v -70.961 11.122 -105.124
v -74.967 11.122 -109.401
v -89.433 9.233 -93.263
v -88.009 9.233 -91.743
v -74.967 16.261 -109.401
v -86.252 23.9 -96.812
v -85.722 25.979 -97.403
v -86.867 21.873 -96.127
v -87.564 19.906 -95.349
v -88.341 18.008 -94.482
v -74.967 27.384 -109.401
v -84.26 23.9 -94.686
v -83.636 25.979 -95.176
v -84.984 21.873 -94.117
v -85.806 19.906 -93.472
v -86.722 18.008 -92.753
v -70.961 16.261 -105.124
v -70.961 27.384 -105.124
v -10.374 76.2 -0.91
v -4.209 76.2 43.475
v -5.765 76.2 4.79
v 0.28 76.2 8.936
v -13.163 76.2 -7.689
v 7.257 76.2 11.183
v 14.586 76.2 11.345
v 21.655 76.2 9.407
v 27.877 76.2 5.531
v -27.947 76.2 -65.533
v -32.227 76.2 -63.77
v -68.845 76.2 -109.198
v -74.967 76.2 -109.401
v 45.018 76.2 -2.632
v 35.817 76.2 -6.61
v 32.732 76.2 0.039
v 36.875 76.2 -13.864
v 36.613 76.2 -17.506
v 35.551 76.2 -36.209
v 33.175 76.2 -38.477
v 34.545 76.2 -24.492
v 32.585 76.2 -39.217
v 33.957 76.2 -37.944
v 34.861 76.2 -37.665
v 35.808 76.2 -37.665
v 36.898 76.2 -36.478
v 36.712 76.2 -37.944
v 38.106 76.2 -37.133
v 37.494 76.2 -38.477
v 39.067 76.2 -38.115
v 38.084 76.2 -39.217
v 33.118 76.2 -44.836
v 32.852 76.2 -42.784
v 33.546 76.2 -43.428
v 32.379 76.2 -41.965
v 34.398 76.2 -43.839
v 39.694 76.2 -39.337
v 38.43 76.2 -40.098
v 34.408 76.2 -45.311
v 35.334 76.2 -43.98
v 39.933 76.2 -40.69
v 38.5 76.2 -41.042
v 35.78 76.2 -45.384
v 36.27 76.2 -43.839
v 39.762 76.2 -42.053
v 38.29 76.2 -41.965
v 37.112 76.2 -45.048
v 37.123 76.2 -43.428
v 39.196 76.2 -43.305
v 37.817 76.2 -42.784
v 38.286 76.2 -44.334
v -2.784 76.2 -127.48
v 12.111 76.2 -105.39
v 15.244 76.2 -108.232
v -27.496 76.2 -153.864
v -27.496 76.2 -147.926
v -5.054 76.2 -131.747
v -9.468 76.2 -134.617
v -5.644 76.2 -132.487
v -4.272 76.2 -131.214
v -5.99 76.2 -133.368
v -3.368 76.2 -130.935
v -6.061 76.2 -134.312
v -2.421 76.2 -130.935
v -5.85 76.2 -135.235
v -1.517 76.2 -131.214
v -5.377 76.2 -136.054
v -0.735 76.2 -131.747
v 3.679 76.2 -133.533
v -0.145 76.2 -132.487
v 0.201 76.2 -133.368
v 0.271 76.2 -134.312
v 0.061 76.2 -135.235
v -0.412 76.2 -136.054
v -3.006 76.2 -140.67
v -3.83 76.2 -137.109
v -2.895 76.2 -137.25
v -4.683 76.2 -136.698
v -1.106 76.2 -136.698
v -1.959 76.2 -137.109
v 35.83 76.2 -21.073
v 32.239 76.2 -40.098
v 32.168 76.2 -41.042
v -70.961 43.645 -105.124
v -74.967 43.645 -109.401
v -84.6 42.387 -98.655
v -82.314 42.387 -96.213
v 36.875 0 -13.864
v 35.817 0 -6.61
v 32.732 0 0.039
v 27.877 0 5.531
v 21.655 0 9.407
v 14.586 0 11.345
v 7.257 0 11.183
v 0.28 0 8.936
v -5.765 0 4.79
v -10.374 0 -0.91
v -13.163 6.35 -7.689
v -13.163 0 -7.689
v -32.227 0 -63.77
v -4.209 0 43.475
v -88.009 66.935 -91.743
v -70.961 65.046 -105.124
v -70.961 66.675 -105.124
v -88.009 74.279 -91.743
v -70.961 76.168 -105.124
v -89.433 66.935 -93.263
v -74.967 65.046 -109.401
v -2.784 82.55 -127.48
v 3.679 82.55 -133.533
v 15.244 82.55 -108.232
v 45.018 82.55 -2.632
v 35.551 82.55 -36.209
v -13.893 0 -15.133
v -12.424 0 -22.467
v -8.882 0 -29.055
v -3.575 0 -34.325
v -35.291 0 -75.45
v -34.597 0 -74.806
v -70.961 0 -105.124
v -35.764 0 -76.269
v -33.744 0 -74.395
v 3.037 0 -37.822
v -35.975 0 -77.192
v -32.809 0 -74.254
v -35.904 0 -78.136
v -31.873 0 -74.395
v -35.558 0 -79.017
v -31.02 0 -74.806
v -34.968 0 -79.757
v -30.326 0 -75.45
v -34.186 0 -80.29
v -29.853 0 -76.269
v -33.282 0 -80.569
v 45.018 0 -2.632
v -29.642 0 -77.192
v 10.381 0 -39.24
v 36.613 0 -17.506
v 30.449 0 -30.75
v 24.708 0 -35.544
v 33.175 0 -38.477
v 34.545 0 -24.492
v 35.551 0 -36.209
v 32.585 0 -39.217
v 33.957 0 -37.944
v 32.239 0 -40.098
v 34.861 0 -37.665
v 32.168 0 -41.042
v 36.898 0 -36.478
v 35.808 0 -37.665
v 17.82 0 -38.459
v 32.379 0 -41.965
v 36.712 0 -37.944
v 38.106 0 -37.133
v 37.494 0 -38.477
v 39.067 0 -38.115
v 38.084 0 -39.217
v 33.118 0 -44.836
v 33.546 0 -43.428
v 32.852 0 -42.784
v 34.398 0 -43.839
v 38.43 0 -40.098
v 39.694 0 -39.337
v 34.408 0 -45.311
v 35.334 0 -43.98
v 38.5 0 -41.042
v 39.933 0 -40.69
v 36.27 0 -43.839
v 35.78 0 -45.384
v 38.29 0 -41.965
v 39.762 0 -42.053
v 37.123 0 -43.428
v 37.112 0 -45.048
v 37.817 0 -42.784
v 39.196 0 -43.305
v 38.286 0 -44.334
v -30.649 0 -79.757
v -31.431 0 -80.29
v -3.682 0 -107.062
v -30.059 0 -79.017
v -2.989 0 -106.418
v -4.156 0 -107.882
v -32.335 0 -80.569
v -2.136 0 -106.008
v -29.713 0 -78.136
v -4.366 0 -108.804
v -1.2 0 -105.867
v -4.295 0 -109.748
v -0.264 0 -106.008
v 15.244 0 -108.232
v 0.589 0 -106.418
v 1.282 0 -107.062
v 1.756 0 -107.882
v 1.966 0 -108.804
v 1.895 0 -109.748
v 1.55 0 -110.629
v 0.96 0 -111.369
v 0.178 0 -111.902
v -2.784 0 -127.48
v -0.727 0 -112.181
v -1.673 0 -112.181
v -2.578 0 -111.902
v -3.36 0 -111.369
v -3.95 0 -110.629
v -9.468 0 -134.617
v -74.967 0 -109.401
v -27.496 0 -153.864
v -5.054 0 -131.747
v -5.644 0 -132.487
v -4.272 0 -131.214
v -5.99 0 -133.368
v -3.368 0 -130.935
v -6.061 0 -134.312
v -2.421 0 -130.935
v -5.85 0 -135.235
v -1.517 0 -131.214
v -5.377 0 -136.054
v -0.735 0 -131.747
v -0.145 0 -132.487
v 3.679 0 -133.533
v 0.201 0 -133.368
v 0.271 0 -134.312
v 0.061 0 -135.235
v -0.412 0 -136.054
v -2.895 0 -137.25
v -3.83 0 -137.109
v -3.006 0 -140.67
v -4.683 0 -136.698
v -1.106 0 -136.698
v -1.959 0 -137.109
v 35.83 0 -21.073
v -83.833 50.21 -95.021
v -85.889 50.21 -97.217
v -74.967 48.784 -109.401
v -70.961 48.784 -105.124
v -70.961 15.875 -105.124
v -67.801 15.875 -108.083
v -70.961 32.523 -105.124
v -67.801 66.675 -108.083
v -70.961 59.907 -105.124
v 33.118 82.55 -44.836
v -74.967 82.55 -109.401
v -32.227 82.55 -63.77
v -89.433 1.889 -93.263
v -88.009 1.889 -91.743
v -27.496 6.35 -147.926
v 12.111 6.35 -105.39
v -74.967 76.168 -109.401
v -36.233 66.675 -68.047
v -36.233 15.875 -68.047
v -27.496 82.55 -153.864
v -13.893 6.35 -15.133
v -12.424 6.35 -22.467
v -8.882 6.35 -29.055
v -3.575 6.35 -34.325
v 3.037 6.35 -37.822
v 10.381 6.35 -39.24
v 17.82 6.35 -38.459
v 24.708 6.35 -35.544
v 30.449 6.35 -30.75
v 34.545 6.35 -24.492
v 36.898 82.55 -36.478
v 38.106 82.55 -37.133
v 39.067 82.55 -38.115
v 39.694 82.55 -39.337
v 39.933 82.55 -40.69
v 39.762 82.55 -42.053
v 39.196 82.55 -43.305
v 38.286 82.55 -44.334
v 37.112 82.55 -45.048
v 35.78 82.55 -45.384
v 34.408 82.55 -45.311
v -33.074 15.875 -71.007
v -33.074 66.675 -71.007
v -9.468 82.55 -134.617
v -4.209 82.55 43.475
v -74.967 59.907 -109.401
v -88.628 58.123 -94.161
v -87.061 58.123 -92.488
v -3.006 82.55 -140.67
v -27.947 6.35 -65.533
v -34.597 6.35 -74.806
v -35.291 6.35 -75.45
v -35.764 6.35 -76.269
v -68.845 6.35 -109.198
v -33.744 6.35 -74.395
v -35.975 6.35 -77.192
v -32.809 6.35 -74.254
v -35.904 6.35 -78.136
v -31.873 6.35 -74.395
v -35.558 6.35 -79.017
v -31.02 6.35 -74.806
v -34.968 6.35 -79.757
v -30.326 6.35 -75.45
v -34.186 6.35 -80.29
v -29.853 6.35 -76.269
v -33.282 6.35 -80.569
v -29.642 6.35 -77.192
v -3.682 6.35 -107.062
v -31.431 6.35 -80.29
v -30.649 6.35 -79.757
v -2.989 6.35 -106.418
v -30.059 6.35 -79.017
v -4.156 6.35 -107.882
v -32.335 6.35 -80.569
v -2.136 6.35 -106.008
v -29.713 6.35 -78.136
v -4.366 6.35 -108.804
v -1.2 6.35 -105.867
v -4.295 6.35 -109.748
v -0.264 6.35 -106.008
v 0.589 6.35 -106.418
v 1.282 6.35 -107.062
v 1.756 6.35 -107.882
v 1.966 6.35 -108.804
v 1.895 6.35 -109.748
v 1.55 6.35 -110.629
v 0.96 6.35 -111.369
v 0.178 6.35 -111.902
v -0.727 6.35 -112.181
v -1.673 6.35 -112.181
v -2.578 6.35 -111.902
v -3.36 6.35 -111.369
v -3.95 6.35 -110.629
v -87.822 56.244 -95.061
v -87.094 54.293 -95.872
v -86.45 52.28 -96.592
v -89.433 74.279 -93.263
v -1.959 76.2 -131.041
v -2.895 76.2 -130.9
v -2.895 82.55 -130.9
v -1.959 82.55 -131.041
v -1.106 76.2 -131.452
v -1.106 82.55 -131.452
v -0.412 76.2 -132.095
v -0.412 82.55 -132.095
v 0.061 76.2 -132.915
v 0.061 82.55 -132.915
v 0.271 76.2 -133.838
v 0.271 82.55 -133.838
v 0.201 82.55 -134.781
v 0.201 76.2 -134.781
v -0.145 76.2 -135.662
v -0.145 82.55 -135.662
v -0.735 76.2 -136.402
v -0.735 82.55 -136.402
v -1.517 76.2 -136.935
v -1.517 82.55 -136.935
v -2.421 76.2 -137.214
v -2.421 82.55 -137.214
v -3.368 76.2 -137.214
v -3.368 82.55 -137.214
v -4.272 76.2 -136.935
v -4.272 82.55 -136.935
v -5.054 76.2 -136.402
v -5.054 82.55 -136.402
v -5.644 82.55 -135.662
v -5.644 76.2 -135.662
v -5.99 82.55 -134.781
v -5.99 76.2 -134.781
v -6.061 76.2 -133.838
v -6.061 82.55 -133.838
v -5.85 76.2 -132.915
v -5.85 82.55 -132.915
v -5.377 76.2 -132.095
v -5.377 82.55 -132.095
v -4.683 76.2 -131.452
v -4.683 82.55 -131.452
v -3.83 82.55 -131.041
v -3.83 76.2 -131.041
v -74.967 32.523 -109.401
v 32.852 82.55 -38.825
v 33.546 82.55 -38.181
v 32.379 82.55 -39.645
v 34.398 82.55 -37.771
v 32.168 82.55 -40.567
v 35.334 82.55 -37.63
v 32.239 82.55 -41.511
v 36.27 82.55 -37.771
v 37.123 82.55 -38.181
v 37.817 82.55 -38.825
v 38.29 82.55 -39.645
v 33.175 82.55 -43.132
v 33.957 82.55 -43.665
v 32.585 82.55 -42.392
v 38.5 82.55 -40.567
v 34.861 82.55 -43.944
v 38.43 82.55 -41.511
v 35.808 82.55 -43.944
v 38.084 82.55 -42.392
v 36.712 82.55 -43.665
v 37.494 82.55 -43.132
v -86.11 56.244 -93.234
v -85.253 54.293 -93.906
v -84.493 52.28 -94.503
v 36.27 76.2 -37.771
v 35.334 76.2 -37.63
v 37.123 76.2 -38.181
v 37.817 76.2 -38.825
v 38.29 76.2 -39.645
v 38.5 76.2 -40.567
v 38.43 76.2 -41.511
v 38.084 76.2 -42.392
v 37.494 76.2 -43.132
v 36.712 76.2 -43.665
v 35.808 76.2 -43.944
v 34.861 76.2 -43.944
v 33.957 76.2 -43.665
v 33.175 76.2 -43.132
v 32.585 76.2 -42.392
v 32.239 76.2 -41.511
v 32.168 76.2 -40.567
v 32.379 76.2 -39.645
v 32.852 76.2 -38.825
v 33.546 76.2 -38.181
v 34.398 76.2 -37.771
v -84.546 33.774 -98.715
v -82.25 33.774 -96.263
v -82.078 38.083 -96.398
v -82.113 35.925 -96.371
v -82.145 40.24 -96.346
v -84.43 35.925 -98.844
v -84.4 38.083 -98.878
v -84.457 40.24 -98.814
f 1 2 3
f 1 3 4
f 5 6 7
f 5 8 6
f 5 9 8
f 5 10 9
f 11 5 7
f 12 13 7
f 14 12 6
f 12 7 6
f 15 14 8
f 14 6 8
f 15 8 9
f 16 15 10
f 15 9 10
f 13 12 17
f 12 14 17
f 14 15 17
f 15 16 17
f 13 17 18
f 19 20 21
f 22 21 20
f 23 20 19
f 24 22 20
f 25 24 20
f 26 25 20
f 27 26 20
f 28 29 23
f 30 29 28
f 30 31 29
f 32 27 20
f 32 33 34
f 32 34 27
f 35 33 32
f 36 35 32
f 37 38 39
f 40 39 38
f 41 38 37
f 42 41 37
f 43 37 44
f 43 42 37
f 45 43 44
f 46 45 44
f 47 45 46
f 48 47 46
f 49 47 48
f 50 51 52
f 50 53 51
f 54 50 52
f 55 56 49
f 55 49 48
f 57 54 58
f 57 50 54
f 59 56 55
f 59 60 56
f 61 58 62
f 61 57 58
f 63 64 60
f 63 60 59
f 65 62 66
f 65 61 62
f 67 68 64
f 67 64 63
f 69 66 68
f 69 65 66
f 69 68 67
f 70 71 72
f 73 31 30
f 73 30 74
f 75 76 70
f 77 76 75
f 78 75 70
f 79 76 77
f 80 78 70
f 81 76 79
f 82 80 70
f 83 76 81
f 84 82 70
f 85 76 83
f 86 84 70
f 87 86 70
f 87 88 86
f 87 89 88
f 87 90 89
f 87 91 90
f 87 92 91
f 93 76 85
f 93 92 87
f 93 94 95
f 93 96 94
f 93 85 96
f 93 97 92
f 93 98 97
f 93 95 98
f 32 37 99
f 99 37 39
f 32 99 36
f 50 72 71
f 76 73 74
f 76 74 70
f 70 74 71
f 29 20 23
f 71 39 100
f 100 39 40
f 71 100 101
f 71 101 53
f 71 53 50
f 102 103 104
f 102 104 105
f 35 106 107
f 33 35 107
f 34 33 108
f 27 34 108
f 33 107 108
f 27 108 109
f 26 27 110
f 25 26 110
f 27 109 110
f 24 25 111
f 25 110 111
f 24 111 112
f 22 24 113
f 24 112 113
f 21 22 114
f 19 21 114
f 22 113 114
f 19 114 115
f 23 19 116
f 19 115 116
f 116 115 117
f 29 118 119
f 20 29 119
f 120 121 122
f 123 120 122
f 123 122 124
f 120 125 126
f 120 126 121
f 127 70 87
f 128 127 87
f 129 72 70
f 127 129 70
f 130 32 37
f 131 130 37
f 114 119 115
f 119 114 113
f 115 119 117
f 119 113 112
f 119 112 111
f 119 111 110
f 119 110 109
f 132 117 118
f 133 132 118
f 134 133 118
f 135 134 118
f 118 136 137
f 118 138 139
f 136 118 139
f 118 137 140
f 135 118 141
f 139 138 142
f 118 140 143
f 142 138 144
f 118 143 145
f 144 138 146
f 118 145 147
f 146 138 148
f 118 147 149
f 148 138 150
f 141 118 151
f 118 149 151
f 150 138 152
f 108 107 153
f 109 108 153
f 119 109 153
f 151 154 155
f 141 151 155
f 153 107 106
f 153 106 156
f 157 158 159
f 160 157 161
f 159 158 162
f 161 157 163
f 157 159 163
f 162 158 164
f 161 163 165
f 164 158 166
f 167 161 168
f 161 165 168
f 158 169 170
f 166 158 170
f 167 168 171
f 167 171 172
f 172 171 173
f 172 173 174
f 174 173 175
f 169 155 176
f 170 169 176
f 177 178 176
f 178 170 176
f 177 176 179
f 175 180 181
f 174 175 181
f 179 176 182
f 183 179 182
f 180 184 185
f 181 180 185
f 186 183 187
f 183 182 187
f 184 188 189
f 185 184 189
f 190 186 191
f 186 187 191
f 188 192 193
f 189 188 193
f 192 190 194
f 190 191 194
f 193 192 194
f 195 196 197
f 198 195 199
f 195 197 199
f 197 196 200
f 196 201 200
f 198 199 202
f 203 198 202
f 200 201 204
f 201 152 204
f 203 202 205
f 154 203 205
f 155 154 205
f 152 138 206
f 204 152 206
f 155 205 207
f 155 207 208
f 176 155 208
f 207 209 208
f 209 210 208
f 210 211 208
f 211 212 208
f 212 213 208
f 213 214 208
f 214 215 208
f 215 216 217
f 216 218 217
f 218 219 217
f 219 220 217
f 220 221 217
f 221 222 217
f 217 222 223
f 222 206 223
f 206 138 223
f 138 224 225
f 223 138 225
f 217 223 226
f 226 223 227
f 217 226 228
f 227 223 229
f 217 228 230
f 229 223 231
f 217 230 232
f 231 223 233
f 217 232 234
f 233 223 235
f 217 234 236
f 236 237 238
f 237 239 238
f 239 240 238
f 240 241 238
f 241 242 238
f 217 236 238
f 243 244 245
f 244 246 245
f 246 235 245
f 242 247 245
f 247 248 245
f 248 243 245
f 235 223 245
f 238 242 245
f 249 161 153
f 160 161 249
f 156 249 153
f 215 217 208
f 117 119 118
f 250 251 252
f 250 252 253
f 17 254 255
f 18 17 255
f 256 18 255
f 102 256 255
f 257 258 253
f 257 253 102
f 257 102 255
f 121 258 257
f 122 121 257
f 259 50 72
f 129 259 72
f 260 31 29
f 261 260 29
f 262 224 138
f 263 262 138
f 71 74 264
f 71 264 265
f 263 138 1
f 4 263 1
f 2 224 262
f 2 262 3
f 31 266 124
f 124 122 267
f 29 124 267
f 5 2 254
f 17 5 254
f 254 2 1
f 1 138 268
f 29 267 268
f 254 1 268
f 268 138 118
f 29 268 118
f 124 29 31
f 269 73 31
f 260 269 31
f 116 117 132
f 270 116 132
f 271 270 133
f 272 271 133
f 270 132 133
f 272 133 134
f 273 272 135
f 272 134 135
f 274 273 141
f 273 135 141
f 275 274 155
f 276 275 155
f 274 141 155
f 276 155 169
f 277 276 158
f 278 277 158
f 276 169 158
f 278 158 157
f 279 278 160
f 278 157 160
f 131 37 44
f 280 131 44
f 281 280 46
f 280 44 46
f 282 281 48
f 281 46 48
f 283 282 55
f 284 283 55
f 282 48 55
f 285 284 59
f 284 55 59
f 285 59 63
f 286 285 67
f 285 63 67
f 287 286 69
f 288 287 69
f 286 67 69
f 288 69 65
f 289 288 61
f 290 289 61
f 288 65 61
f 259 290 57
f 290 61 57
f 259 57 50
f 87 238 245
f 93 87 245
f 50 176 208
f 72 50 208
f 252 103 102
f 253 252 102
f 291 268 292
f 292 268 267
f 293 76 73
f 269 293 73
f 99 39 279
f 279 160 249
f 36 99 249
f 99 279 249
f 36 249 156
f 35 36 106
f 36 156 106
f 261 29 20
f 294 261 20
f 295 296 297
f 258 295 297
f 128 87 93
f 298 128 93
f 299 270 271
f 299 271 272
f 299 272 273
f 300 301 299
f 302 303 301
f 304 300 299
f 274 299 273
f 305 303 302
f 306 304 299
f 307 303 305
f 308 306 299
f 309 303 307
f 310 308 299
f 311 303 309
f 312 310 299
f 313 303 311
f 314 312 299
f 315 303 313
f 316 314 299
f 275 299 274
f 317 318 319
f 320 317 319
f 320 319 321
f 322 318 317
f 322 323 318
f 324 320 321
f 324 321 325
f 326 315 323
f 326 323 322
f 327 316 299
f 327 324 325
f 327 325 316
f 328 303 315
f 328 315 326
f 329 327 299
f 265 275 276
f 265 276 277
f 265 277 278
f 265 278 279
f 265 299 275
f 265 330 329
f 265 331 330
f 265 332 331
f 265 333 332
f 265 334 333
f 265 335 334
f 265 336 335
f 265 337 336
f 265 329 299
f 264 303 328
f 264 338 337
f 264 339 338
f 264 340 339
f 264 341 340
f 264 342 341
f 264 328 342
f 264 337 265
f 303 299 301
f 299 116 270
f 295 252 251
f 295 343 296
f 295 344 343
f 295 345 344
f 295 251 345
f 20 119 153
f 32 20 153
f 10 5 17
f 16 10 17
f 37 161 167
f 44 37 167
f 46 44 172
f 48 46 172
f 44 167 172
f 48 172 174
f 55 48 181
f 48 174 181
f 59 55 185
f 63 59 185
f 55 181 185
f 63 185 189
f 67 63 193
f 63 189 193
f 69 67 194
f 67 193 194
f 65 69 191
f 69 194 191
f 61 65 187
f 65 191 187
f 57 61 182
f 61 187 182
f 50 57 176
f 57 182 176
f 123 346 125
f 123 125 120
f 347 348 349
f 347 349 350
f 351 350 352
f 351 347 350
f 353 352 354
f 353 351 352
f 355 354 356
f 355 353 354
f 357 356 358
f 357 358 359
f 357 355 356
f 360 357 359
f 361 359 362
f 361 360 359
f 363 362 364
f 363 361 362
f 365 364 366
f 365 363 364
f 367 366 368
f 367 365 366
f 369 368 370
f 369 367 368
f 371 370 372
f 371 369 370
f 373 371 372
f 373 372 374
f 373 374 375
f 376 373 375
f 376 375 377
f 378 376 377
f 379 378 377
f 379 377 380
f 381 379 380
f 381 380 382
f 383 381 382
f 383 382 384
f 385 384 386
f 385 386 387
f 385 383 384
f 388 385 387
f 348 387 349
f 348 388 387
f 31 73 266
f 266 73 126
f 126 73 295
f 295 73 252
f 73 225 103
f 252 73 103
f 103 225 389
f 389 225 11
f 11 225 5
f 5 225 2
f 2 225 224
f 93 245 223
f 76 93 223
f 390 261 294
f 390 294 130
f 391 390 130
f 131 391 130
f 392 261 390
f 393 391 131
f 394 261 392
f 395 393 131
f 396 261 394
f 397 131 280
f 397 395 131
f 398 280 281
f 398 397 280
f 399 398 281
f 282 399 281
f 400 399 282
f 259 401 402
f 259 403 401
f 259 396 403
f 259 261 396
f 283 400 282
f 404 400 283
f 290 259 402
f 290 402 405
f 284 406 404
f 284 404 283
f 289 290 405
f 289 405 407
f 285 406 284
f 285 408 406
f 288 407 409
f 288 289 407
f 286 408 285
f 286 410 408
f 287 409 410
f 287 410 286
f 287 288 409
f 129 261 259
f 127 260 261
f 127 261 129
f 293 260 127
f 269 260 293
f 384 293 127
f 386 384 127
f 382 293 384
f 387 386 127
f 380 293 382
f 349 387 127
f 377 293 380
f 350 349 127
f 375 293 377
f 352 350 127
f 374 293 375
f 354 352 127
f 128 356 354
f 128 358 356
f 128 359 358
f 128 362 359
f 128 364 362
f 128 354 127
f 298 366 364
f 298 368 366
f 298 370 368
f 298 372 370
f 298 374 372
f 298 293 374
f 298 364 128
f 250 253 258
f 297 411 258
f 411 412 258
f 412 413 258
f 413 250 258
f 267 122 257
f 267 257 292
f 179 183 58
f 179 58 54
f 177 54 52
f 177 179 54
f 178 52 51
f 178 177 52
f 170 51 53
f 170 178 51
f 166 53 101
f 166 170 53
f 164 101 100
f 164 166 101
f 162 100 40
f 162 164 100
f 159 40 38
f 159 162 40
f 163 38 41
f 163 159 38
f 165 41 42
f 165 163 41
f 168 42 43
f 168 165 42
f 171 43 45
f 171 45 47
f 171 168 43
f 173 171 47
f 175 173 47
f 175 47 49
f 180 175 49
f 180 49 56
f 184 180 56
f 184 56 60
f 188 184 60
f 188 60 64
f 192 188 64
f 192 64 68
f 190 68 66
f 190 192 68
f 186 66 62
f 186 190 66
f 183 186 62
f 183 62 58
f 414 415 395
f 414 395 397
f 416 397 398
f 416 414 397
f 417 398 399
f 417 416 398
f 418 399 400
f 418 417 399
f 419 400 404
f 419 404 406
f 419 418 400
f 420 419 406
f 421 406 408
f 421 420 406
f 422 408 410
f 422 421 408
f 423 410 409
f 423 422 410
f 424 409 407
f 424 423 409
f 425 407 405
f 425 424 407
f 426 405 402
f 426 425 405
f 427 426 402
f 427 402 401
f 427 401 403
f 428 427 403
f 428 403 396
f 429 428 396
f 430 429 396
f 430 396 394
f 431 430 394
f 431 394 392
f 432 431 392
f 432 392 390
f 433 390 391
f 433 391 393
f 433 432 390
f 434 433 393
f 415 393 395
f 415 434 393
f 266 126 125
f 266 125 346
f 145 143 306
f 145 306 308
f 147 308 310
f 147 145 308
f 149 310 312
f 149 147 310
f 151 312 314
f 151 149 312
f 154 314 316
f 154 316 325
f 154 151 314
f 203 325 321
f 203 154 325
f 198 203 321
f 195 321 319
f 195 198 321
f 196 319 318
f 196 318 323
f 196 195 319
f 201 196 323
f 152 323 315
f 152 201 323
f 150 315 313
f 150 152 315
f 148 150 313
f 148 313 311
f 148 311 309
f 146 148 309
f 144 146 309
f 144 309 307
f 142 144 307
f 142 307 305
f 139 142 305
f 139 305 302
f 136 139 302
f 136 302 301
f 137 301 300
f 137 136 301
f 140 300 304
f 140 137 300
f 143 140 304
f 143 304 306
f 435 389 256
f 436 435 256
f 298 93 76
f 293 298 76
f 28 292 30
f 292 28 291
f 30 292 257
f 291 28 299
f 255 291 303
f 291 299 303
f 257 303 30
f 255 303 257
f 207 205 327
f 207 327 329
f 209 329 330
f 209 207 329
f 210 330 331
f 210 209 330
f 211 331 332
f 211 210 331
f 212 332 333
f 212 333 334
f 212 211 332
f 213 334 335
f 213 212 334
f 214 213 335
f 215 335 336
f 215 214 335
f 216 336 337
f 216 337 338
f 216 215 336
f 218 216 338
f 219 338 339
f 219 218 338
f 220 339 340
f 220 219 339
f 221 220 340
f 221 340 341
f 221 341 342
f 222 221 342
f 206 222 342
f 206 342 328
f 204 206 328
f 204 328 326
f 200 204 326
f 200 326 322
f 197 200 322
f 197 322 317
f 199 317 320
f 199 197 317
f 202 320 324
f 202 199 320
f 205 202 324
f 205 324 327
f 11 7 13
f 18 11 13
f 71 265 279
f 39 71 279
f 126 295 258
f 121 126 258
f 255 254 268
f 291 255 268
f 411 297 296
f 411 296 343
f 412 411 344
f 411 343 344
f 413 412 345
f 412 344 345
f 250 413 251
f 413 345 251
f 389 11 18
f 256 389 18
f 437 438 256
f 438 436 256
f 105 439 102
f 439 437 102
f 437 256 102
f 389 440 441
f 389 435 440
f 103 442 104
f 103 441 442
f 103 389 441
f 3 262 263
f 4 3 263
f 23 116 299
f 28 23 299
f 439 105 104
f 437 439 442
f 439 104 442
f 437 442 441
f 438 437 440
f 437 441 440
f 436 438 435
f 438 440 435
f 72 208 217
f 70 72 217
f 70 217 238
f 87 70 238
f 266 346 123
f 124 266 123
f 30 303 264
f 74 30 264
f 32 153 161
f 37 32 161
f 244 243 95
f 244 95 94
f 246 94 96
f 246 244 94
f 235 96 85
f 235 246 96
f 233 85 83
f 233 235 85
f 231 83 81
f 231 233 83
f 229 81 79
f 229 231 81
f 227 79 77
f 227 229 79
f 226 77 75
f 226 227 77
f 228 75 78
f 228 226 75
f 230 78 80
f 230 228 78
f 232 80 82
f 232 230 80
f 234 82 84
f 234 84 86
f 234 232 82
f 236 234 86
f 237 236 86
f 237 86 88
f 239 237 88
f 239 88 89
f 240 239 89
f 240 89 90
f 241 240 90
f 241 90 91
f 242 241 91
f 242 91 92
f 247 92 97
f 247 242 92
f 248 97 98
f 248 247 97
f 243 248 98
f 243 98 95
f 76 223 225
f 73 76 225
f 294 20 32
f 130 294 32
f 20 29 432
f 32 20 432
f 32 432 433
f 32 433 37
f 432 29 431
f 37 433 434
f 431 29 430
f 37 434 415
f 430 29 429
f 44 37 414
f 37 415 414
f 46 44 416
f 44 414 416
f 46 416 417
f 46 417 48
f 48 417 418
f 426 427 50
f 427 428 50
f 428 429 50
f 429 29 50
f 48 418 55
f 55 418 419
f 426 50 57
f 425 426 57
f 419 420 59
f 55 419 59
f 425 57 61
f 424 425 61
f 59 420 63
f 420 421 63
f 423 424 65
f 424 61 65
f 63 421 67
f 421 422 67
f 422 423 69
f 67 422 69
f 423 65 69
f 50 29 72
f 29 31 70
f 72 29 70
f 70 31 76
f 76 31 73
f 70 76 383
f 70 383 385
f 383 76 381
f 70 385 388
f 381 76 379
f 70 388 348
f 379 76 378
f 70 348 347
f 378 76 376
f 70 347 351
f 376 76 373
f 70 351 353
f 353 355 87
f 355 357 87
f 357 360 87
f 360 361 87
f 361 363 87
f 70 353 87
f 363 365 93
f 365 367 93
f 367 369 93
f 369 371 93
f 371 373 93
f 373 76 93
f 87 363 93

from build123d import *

# Parameters (mm, degrees)
SKETCH1_R                     = 3.175
BOSS_EXTRUDE2_DEPTH           = 76.2
SKETCH1_5_R                   = 3.175
BOSS_EXTRUDE3_DEPTH           = 6.35
SKETCH5_R                     = 3.175
BOSS_EXTRUDE4_DEPTH           = 6.35
SKETCH6_W                     = 50.8
SKETCH6_H                     = 50.8
CUT_EXTRUDE1_DEPTH            = 21.59
SKETCH7_W                     = 5.86068256
SKETCH7_H                     = 11.122345704
BOSS_EXTRUDE5_DEPTH           = 21.59
BOSS_EXTRUDE5_DRAFT           = 5
BOSS_EXTRUDE5_PROFILE_2_DEPTH = 21.59
BOSS_EXTRUDE5_PROFILE_2_DRAFT = 5
BOSS_EXTRUDE5_PROFILE_3_DEPTH = 21.59
BOSS_EXTRUDE5_PROFILE_3_DRAFT = 5
SKETCH7_H_2                   = 11.122345705
BOSS_EXTRUDE5_PROFILE_4_DEPTH = 21.59
BOSS_EXTRUDE5_PROFILE_4_DRAFT = 5
BOSS_EXTRUDE5_PROFILE_5_DEPTH = 21.59
BOSS_EXTRUDE5_PROFILE_5_DRAFT = 5
SKETCH10_R                    = 36.051864109
CUT_EXTRUDE2_DEPTH            = 21.59


with BuildPart() as part:
    # Sketch1 → Boss-Extrude2 (new body)
    with BuildSketch(Plane(origin=(0, 0, 0), x_dir=(1, 0, 0), z_dir=(0, 1, 0))):
        with BuildLine():
            Line((-4.208751998, -43.475305064), (45.017746951, 2.631829887))
            Line((45.017746951, 2.631829887), (35.550660053, 36.209226482))
            ThreePointArc((35.550660053, 36.209226482), (39.762177432, 42.05307025), (33.11828595, 44.83625091))
            Line((33.11828595, 44.83625091), (15.243844224, 108.232438689))
            Line((15.243844224, 108.232438689), (-2.783728935, 127.479661752))
            Line((-2.783728935, 127.479661752), (3.678966496, 133.532831827))
            Line((3.678966496, 133.532831827), (-3.005742225, 140.669792455))
            Line((-3.005742225, 140.669792455), (-9.468437655, 134.61662238))
            Line((-9.468437655, 134.61662238), (-27.496010814, 153.863845442))
            Line((-27.496010814, 153.863845442), (-74.966911398, 109.401060841))
            Line((-74.966911398, 109.401060841), (-32.227053049, 63.769650553))
            Line((-32.227053049, 63.769650553), (-4.208751998, -43.475305064))
        make_face()
        with Locations((35.334305242, 40.804639607)):
            Circle(SKETCH1_R, mode=Mode.SUBTRACT)
        with BuildLine():
            Line((-27.946524097, 65.532765046), (-68.844709626, 109.197904706))
            Line((-68.844709626, 109.197904706), (-27.496010814, 147.926436632))
            Line((-27.496010814, 147.926436632), (12.111157264, 105.390011693))
            Line((12.111157264, 105.390011693), (34.544848217, 24.491577435))
            ThreePointArc((34.544848217, 24.491577435), (36.285698832, 19.303992732), (36.875100326, 13.863937421))
            ThreePointArc((36.875100326, 13.863937421), (14.585843996, -11.34485616), (-13.162952731, 7.689284266))
            Line((-13.162952731, 7.689284266), (-27.946524097, 65.532765046))
        make_face(mode=Mode.SUBTRACT)
        with Locations((-2.894634056, 134.074815557)):
            Circle(SKETCH1_R, mode=Mode.SUBTRACT)
    extrude(amount=BOSS_EXTRUDE2_DEPTH)

    # Sketch1<5> → Boss-Extrude3 (add)
    with BuildSketch(Plane(origin=(0, 0, 0), x_dir=(1, 0, 0), z_dir=(0, 1, 0))):
        with BuildLine():
            Line((-27.496010814, 147.926436632), (-68.844709626, 109.197904706))
            Line((-68.844709626, 109.197904706), (-27.946524097, 65.532765046))
            Line((-27.946524097, 65.532765046), (-13.162952731, 7.689284266))
            ThreePointArc((-13.162952731, 7.689284266), (3.03743719, 37.821521623), (34.544848217, 24.491577435))
            Line((34.544848217, 24.491577435), (12.111157264, 105.390011693))
            Line((12.111157264, 105.390011693), (-27.496010814, 147.926436632))
        make_face()
        with Locations((-32.808552916, 77.429328599)):
            Circle(SKETCH1_5_R, mode=Mode.SUBTRACT)
        with Locations((-1.199981142, 109.041759799)):
            Circle(SKETCH1_5_R, mode=Mode.SUBTRACT)
    extrude(amount=BOSS_EXTRUDE3_DEPTH)

    # Sketch6 → Cut-Extrude1 (cut)
    with BuildSketch(Plane(origin=(14.64974053, 0, -13.721421958), x_dir=(0.683604049055853, 0, 0.729853070223345), z_dir=(-0.729853070223345, 0, 0.683604049055853))):
        with Locations((-99.833701757, 41.275)):
            Rectangle(SKETCH6_W, SKETCH6_H)
    extrude(amount=-CUT_EXTRUDE1_DEPTH, mode=Mode.SUBTRACT)


with BuildPart() as body_2:
    # Sketch5 → Boss-Extrude4 (new body)
    with BuildSketch(Plane(origin=(0, 76.2, 0), x_dir=(1, 0, 0), z_dir=(0, 1, 0))):
        with BuildLine():
            Line((45.017746951, 2.631829887), (35.550660053, 36.209226482))
            ThreePointArc((35.550660053, 36.209226482), (39.762177432, 42.05307025), (33.11828595, 44.83625091))
            Line((33.11828595, 44.83625091), (15.243844224, 108.232438689))
            Line((15.243844224, 108.232438689), (-2.783728935, 127.479661752))
            Line((-2.783728935, 127.479661752), (3.678966496, 133.532831827))
            Line((3.678966496, 133.532831827), (-3.005742225, 140.669792455))
            Line((-3.005742225, 140.669792455), (-9.468437655, 134.61662238))
            Line((-9.468437655, 134.61662238), (-27.496010814, 153.863845442))
            Line((-27.496010814, 153.863845442), (-74.966911398, 109.401060841))
            Line((-74.966911398, 109.401060841), (-32.227053049, 63.769650553))
            Line((-32.227053049, 63.769650553), (-4.208751998, -43.475305064))
            Line((-4.208751998, -43.475305064), (45.017746951, 2.631829887))
        make_face()
        with Locations((-2.894634056, 134.074815557)):
            Circle(SKETCH5_R, mode=Mode.SUBTRACT)
        with Locations((35.334305242, 40.804639607)):
            Circle(SKETCH5_R, mode=Mode.SUBTRACT)
    extrude(amount=BOSS_EXTRUDE4_DEPTH)


with BuildPart() as boss_extrude5_tool:
    # Sketch7 → Boss-Extrude5 (with draft: the straight prism first)
    with BuildSketch(Plane(origin=(14.64974053, 0, -13.721421958), x_dir=(0.683604049055853, 0, 0.729853070223345), z_dir=(-0.729853070223345, 0, 0.683604049055853))):
        with Locations((-128.164043037, 70.606947953)):
            Rectangle(SKETCH7_W, SKETCH7_H)
    extrude(amount=BOSS_EXTRUDE5_DEPTH)
    # Boss-Extrude5: the draft: its side faces are tilted about the plane it starts from
    boss_extrude5_sides = [boss_extrude5_tool.faces().sort_by_distance(p)[0] for p in [
        (-82.845675291, 70.606947953, -102.021555132),
        (-80.842482126, 65.045775101, -99.882836552),
        (-78.839288962, 70.606947953, -97.744117972),
        (-80.842482126, 76.168120805, -99.882836552),
    ]]
    draft(boss_extrude5_sides, Plane(origin=(14.64974053, 0, -13.721421958), x_dir=(0.683604049055853, 0, 0.729853070223345), z_dir=(-0.729853070223345, 0, 0.683604049055853)), BOSS_EXTRUDE5_DRAFT)


with BuildPart() as part_1:
    add(part.part)

    # Boss-Extrude5: add boss_extrude5_tool
    add(boss_extrude5_tool.part)


with BuildPart() as boss_extrude5_profile_2_tool:
    # Sketch7 → Boss-Extrude5 profile 2 (with draft: the straight prism first)
    with BuildSketch(Plane(origin=(14.64974053, 0, -13.721421958), x_dir=(0.683604049055853, 0, 0.729853070223345), z_dir=(-0.729853070223345, 0, 0.683604049055853))):
        with Locations((-128.164043037, 54.345504178)):
            Rectangle(SKETCH7_W, SKETCH7_H)
    extrude(amount=BOSS_EXTRUDE5_PROFILE_2_DEPTH)
    # Boss-Extrude5 profile 2: the draft: its side faces are tilted about the plane it starts from
    boss_extrude5_profile_2_sides = [boss_extrude5_profile_2_tool.faces().sort_by_distance(p)[0] for p in [
        (-80.842482126, 48.784331326, -99.882836552),
        (-78.839288962, 54.345504178, -97.744117972),
        (-80.842482126, 59.90667703, -99.882836552),
        (-82.845675291, 54.345504178, -102.021555132),
    ]]
    draft(boss_extrude5_profile_2_sides, Plane(origin=(14.64974053, 0, -13.721421958), x_dir=(0.683604049055853, 0, 0.729853070223345), z_dir=(-0.729853070223345, 0, 0.683604049055853)), BOSS_EXTRUDE5_PROFILE_2_DRAFT)


with BuildPart() as part_2:
    add(part_1.part)

    # Boss-Extrude5 profile 2: add boss_extrude5_profile_2_tool
    add(boss_extrude5_profile_2_tool.part)


with BuildPart() as boss_extrude5_profile_3_tool:
    # Sketch7 → Boss-Extrude5 profile 3 (with draft: the straight prism first)
    with BuildSketch(Plane(origin=(14.64974053, 0, -13.721421958), x_dir=(0.683604049055853, 0, 0.729853070223345), z_dir=(-0.729853070223345, 0, 0.683604049055853))):
        with Locations((-128.164043037, 38.084060403)):
            Rectangle(SKETCH7_W, SKETCH7_H)
    extrude(amount=BOSS_EXTRUDE5_PROFILE_3_DEPTH)
    # Boss-Extrude5 profile 3: the draft: its side faces are tilted about the plane it starts from
    boss_extrude5_profile_3_sides = [boss_extrude5_profile_3_tool.faces().sort_by_distance(p)[0] for p in [
        (-80.842482126, 32.522887551, -99.882836552),
        (-78.839288962, 38.084060403, -97.744117972),
        (-80.842482126, 43.645233255, -99.882836552),
        (-82.845675291, 38.084060403, -102.021555132),
    ]]
    draft(boss_extrude5_profile_3_sides, Plane(origin=(14.64974053, 0, -13.721421958), x_dir=(0.683604049055853, 0, 0.729853070223345), z_dir=(-0.729853070223345, 0, 0.683604049055853)), BOSS_EXTRUDE5_PROFILE_3_DRAFT)


with BuildPart() as part_3:
    add(part_2.part)

    # Boss-Extrude5 profile 3: add boss_extrude5_profile_3_tool
    add(boss_extrude5_profile_3_tool.part)


with BuildPart() as boss_extrude5_profile_4_tool:
    # Sketch7 → Boss-Extrude5 profile 4 (with draft: the straight prism first)
    with BuildSketch(Plane(origin=(14.64974053, 0, -13.721421958), x_dir=(0.683604049055853, 0, 0.729853070223345), z_dir=(-0.729853070223345, 0, 0.683604049055853))):
        with Locations((-128.164043037, 21.822616628)):
            Rectangle(SKETCH7_W, SKETCH7_H_2)
    extrude(amount=BOSS_EXTRUDE5_PROFILE_4_DEPTH)
    # Boss-Extrude5 profile 4: the draft: its side faces are tilted about the plane it starts from
    boss_extrude5_profile_4_sides = [boss_extrude5_profile_4_tool.faces().sort_by_distance(p)[0] for p in [
        (-80.842482126, 16.261443775, -99.882836552),
        (-78.839288962, 21.822616627, -97.744117972),
        (-80.842482126, 27.38378948, -99.882836552),
        (-82.845675291, 21.822616627, -102.021555132),
    ]]
    draft(boss_extrude5_profile_4_sides, Plane(origin=(14.64974053, 0, -13.721421958), x_dir=(0.683604049055853, 0, 0.729853070223345), z_dir=(-0.729853070223345, 0, 0.683604049055853)), BOSS_EXTRUDE5_PROFILE_4_DRAFT)


with BuildPart() as part_4:
    add(part_3.part)

    # Boss-Extrude5 profile 4: add boss_extrude5_profile_4_tool
    add(boss_extrude5_profile_4_tool.part)


with BuildPart() as boss_extrude5_profile_5_tool:
    # Sketch7 → Boss-Extrude5 profile 5 (with draft: the straight prism first)
    with BuildSketch(Plane(origin=(14.64974053, 0, -13.721421958), x_dir=(0.683604049055853, 0, 0.729853070223345), z_dir=(-0.729853070223345, 0, 0.683604049055853))):
        with Locations((-128.164043037, 5.561172852)):
            Rectangle(SKETCH7_W, SKETCH7_H)
    extrude(amount=BOSS_EXTRUDE5_PROFILE_5_DEPTH)
    # Boss-Extrude5 profile 5: the draft: its side faces are tilted about the plane it starts from
    boss_extrude5_profile_5_sides = [boss_extrude5_profile_5_tool.faces().sort_by_distance(p)[0] for p in [
        (-80.842482126, 0, -99.882836552),
        (-78.839288962, 5.561172852, -97.744117972),
        (-80.842482126, 11.122345704, -99.882836552),
        (-82.845675291, 5.561172852, -102.021555132),
    ]]
    draft(boss_extrude5_profile_5_sides, Plane(origin=(14.64974053, 0, -13.721421958), x_dir=(0.683604049055853, 0, 0.729853070223345), z_dir=(-0.729853070223345, 0, 0.683604049055853)), BOSS_EXTRUDE5_PROFILE_5_DRAFT)


with BuildPart() as part_5:
    add(part_4.part)

    # Boss-Extrude5 profile 5: add boss_extrude5_profile_5_tool
    add(boss_extrude5_profile_5_tool.part)

    # Sketch10 → Cut-Extrude2 (cut)
    with BuildSketch(Plane(origin=(-89.616651928, 0, -95.679638883), x_dir=(-0.7298530702233451, 0, 0.683604049055853), z_dir=(-0.683604049055853, 0, -0.7298530702233451))):
        with Locations((30.057024975, 37.74518963)):
            Circle(SKETCH10_R)
    extrude(amount=-CUT_EXTRUDE2_DEPTH, mode=Mode.SUBTRACT)


solid = Compound([body_2.part, part_5.part])
